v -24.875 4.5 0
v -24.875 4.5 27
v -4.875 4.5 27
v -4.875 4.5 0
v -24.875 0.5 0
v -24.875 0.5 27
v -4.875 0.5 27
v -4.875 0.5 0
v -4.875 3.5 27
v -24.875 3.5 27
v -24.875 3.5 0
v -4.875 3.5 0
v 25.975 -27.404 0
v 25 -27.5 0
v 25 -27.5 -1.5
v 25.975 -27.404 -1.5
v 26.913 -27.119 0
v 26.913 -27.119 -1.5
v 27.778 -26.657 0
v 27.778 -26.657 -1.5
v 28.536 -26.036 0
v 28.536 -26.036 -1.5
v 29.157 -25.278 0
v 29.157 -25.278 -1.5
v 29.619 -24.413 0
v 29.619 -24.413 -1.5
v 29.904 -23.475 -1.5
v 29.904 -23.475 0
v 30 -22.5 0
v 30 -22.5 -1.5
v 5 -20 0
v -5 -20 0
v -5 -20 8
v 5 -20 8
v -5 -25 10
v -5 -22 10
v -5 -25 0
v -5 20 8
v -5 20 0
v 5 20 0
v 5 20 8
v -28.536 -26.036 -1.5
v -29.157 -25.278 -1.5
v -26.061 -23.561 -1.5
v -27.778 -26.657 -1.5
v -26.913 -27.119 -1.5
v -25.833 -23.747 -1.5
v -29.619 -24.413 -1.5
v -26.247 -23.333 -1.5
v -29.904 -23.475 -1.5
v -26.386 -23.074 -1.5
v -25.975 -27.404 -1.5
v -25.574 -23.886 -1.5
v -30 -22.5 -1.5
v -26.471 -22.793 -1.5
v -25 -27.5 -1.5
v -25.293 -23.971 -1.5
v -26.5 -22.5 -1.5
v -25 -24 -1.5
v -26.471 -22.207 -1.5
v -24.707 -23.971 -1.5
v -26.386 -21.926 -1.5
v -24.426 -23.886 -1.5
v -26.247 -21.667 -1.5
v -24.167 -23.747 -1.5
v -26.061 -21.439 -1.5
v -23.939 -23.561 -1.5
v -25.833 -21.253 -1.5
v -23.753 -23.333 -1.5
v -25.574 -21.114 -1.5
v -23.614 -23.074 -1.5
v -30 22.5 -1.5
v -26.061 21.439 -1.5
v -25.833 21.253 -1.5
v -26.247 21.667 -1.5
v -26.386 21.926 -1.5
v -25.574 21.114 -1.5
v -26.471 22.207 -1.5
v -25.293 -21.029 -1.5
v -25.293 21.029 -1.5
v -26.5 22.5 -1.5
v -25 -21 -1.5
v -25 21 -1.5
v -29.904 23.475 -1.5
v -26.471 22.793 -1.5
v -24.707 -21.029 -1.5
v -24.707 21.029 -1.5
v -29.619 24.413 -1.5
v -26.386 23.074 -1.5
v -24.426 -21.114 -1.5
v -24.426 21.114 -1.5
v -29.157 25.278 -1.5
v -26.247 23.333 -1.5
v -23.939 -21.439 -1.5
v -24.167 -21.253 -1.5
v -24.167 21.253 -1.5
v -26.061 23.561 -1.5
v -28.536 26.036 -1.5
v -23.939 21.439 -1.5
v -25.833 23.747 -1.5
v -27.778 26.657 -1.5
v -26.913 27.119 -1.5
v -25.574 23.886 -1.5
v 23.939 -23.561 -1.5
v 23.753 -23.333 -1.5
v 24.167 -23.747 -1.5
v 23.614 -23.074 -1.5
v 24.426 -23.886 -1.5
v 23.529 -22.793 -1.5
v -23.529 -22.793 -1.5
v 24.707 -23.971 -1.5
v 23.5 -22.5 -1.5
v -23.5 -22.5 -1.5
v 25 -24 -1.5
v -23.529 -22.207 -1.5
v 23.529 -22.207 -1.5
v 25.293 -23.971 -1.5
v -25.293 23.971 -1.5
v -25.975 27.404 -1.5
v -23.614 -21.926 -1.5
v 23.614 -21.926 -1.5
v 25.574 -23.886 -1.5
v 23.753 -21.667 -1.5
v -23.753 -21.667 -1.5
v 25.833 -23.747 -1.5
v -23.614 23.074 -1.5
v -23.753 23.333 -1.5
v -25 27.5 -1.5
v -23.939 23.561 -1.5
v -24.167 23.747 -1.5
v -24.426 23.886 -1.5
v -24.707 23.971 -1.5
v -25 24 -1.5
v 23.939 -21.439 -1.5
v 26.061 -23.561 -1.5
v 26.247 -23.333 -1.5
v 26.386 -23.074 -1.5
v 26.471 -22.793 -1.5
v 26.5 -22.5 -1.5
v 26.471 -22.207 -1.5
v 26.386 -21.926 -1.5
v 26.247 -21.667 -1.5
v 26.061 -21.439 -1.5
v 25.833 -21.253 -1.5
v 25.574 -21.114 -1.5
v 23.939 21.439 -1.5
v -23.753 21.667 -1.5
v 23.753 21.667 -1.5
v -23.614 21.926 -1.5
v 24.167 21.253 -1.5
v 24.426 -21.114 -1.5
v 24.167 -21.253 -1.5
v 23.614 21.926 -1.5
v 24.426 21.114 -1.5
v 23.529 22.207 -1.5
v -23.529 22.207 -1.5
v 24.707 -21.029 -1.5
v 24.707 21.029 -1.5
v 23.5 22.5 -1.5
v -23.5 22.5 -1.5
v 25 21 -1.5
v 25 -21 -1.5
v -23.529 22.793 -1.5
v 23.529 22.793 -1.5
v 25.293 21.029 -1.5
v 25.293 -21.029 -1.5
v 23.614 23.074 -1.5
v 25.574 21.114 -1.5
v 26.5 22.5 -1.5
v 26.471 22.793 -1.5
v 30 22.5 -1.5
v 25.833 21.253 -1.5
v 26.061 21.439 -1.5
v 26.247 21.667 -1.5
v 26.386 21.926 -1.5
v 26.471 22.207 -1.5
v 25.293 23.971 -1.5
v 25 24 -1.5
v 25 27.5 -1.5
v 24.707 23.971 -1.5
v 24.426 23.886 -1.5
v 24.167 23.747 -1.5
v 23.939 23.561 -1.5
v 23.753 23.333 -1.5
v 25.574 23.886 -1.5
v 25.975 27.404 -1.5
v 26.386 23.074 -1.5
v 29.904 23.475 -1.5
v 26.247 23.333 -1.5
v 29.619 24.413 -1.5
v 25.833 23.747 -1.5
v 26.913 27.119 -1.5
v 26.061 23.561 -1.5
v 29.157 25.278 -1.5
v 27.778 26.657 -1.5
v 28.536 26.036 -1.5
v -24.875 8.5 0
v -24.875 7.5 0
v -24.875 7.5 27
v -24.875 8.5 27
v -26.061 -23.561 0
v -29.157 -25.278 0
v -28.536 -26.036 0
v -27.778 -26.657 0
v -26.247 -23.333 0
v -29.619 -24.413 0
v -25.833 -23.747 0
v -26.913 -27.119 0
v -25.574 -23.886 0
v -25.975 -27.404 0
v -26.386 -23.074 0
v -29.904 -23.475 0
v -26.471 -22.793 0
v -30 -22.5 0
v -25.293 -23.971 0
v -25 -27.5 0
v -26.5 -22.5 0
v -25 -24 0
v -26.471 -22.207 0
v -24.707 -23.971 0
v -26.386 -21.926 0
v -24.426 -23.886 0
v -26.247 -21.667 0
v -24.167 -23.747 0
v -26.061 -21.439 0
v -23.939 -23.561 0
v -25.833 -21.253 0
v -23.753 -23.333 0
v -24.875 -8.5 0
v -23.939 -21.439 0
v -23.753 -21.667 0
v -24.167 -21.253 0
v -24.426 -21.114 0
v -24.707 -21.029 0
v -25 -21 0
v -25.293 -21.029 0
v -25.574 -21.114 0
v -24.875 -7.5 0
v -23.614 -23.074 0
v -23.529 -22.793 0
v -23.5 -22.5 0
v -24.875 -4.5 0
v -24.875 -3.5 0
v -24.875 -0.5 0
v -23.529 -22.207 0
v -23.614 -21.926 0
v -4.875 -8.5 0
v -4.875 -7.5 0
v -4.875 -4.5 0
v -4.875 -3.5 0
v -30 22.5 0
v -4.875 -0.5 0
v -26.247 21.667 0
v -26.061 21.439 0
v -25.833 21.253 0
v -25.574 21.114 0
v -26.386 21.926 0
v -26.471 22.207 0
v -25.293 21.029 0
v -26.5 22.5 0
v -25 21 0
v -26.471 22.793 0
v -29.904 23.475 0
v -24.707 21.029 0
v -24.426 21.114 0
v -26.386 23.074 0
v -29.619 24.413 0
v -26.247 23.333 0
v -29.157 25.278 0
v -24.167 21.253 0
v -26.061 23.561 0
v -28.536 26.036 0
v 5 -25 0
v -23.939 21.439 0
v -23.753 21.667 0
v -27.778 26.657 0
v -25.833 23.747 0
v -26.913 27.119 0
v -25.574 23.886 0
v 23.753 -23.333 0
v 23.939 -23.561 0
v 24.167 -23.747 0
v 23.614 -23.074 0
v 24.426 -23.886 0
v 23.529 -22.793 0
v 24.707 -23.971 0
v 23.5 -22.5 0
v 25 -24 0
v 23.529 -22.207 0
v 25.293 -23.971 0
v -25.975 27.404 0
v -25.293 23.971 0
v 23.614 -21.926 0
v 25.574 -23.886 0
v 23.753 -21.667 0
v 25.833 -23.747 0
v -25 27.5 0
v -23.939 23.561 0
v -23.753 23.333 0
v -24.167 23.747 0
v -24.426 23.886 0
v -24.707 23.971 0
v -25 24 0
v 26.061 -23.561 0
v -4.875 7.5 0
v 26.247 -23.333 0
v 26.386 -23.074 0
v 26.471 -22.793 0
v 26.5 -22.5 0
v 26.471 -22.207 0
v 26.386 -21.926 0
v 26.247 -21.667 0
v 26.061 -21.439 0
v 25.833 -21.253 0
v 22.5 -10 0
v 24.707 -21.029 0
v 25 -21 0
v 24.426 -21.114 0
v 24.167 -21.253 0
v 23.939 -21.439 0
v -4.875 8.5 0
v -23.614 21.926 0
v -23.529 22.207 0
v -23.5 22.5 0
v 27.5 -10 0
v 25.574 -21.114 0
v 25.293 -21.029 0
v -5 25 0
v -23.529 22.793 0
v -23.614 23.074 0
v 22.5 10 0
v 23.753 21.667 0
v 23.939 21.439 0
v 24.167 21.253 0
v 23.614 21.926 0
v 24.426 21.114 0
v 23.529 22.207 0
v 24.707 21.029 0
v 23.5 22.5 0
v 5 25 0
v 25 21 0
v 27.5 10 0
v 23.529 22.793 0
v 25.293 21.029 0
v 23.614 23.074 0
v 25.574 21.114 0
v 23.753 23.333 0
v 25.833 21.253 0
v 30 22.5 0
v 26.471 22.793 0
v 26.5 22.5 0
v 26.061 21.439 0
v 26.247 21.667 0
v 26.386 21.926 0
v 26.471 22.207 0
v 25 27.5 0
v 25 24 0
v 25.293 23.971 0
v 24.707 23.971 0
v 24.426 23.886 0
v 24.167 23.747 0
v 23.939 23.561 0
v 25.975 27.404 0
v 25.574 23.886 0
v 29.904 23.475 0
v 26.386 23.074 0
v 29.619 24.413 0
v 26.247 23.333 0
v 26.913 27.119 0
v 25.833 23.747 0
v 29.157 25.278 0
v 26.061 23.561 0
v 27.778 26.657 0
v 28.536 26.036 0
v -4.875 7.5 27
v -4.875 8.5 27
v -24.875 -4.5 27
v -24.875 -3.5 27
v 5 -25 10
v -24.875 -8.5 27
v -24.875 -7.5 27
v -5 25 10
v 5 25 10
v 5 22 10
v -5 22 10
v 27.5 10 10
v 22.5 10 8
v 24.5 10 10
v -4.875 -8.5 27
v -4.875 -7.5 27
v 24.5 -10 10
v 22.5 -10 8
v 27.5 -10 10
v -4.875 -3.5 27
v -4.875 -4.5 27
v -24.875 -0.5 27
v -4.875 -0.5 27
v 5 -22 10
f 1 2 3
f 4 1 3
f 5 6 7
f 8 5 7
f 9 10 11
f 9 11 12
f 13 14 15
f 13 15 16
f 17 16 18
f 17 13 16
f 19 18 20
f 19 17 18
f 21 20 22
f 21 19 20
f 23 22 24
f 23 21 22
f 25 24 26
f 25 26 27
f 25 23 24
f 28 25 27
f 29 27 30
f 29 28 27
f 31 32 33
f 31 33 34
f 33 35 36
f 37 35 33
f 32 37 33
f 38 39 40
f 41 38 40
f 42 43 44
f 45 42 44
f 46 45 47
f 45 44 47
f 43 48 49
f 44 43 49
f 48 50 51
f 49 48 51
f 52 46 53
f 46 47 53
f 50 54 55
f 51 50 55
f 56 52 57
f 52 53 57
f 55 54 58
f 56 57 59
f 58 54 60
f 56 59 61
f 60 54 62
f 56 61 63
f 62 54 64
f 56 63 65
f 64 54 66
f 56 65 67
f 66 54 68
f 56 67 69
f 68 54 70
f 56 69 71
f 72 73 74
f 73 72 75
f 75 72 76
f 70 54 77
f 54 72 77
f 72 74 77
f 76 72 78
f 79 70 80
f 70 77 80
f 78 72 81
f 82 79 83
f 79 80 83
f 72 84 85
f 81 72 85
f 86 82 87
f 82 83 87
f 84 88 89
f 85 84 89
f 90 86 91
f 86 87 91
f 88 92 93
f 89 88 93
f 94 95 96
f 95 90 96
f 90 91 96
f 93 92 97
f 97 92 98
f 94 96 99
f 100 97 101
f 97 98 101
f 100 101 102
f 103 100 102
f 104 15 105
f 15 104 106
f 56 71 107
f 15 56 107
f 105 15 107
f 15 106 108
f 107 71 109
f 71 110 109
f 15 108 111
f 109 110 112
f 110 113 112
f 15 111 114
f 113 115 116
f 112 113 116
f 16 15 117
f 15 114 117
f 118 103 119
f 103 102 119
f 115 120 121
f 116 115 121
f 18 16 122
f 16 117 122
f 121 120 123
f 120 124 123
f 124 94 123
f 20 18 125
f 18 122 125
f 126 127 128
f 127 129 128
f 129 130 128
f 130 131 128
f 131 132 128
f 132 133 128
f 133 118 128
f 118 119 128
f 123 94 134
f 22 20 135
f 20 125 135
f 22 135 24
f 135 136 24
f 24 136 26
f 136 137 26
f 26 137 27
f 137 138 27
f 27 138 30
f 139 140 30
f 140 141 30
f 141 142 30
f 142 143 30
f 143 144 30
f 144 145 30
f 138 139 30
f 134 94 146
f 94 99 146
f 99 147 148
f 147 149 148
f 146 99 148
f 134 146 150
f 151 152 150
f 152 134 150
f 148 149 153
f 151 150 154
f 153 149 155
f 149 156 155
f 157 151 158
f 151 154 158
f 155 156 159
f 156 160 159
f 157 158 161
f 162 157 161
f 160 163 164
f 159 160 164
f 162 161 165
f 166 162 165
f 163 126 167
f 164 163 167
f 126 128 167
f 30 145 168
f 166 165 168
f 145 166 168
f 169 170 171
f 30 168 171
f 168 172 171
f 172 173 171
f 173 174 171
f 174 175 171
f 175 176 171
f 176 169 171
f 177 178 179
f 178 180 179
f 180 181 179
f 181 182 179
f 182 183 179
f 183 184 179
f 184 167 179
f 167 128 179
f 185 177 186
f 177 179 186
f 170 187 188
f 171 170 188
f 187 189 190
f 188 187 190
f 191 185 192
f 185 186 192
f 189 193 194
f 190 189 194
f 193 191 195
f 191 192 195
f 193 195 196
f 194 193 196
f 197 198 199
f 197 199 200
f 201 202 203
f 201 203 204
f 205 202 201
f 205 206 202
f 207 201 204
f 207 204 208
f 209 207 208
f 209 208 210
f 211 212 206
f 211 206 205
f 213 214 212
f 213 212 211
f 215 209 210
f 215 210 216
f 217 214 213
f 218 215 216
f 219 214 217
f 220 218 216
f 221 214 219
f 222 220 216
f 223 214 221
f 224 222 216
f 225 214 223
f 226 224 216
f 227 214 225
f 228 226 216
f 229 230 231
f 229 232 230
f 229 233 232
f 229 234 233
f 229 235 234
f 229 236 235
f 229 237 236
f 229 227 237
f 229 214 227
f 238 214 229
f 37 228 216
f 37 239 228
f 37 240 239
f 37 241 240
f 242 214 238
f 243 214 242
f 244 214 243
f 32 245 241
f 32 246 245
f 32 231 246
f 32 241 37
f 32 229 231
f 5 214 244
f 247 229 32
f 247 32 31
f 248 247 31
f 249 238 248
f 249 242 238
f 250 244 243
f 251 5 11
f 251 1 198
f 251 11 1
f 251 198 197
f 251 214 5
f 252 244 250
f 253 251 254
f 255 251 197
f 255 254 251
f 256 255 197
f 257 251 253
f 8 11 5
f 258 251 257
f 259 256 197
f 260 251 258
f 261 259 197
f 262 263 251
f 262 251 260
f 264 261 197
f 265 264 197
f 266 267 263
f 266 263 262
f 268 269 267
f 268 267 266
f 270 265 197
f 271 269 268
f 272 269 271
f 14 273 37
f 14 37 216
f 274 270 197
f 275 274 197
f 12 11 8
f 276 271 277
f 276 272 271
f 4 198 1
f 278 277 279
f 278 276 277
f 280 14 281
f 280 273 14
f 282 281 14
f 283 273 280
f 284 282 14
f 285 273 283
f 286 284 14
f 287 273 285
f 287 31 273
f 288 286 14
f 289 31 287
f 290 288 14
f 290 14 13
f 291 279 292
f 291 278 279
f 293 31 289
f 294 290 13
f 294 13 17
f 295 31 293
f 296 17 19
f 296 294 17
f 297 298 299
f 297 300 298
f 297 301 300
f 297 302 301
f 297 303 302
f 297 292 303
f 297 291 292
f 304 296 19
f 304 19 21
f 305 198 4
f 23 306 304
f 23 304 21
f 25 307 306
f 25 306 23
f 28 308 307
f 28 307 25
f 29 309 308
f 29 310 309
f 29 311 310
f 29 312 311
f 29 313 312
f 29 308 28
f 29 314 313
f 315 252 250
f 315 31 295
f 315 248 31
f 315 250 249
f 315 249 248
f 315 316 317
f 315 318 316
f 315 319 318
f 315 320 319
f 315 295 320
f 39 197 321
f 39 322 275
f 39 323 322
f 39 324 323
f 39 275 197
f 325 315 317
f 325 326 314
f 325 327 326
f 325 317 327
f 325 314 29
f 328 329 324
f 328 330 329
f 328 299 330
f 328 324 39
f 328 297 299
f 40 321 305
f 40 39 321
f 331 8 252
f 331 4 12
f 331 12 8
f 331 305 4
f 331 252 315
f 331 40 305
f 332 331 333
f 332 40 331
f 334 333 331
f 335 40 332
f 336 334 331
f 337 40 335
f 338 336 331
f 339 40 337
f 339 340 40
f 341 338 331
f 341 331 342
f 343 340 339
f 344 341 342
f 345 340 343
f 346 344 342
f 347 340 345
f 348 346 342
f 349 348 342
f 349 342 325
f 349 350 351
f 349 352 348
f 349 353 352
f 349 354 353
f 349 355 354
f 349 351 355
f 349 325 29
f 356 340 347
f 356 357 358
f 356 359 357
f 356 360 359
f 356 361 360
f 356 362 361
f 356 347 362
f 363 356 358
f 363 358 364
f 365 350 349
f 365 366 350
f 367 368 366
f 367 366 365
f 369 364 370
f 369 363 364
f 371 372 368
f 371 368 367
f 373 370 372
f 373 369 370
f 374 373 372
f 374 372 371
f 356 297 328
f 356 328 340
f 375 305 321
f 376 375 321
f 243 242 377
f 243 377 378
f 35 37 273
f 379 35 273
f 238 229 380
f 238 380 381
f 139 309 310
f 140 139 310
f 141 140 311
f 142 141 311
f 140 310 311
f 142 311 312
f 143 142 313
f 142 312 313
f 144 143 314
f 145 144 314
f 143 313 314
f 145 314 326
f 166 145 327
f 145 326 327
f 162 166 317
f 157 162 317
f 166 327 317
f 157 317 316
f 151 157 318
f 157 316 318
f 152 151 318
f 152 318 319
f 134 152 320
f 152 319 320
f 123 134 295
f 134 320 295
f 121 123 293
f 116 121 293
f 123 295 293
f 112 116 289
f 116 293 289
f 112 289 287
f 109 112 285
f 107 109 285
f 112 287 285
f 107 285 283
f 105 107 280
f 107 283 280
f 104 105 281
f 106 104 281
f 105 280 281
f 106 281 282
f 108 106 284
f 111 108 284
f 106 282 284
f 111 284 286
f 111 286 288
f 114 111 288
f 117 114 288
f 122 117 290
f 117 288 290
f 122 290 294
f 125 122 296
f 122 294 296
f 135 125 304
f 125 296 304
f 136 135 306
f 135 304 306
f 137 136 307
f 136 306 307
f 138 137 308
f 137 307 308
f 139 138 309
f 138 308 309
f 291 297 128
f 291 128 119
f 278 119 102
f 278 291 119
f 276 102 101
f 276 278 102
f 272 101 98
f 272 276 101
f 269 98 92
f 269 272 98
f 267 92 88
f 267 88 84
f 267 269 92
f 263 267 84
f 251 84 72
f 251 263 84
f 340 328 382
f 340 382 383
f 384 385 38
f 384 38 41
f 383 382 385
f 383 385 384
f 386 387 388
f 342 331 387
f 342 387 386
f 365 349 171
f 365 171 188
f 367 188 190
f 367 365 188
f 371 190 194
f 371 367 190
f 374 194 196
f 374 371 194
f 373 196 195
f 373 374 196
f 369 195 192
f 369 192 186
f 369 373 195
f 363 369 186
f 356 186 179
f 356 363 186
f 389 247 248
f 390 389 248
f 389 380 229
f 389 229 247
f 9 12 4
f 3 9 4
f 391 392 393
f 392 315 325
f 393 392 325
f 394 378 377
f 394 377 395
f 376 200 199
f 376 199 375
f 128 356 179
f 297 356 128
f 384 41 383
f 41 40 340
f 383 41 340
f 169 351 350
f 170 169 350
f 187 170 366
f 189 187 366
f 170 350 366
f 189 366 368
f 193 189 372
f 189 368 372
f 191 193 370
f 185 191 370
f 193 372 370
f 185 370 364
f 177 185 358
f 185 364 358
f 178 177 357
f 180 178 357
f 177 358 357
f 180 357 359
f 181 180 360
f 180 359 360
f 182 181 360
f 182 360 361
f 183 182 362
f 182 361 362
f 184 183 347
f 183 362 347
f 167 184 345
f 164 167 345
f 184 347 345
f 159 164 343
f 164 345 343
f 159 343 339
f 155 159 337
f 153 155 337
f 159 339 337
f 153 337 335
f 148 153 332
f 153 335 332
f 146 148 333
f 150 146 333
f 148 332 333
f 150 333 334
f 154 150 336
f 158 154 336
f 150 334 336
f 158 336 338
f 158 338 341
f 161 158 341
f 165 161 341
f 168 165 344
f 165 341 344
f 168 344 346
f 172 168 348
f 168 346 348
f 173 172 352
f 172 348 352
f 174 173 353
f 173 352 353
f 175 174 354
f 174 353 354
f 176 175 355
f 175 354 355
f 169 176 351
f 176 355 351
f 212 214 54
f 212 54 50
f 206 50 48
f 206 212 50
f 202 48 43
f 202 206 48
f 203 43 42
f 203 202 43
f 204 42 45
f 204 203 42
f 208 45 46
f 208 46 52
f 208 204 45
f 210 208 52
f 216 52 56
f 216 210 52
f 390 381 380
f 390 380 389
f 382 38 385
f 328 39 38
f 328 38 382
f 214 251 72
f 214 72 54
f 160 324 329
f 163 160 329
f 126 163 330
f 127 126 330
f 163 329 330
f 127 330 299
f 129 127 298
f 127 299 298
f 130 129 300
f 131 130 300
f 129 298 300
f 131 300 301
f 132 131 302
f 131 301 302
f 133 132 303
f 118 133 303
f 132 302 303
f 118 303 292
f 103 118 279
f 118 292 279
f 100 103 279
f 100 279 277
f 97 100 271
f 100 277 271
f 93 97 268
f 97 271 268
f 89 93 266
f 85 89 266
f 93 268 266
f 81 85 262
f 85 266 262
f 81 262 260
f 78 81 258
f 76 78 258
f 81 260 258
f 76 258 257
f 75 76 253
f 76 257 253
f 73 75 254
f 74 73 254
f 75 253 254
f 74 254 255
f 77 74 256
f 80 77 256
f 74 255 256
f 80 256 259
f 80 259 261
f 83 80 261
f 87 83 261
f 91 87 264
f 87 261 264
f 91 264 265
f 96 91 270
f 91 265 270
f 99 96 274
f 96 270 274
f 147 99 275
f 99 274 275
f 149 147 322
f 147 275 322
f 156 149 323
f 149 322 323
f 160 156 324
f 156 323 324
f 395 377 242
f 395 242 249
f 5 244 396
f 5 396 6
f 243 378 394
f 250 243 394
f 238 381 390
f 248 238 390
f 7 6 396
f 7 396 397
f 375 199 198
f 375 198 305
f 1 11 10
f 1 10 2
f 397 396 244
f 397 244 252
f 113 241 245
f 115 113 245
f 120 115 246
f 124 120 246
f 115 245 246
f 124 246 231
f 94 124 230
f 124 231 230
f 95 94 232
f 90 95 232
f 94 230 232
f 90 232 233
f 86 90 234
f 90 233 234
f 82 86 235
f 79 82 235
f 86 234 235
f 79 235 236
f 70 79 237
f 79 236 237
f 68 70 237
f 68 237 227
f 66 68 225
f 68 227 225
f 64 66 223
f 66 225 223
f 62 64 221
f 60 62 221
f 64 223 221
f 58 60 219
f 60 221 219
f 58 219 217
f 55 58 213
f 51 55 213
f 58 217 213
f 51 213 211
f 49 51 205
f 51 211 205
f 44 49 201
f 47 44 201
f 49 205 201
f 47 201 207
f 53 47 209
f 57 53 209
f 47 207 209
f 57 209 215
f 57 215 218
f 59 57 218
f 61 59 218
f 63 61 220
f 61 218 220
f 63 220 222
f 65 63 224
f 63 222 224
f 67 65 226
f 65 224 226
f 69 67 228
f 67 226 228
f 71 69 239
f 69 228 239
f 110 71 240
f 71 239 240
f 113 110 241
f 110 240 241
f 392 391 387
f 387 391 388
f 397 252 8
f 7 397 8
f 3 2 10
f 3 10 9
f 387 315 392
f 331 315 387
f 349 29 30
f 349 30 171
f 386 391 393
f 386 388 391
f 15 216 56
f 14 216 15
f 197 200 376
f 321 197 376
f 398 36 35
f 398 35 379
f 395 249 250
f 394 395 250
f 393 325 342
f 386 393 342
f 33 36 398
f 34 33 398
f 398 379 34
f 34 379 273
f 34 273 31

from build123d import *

# Parameters (mm, degrees)
F0_R     = 1.5
F1_DEPTH = 1.5
F2_W     = 20
F2_H     = 1
F3_DEPTH = 27
F4_W     = 10
F4_H     = 5
F4_W_2   = 5
F4_H_2   = 20
F5_DEPTH = 10
F6_SIZE  = 2


with BuildPart() as f1:
    # F0 (on Top) → F1 (new body)
    with BuildSketch(Plane.XY):
        with BuildLine():
            ThreePointArc((30, 22.5), (28.535534, 26.035534), (25, 27.5))
            Line((25, 27.5), (-25, 27.5))
            ThreePointArc((-25, 27.5), (-28.535534, 26.035534), (-30, 22.5))
            Line((-30, 22.5), (-30, -22.5))
            ThreePointArc((-30, -22.5), (-28.535534, -26.035534), (-25, -27.5))
            Line((-25, -27.5), (25, -27.5))
            ThreePointArc((25, -27.5), (28.535534, -26.035534), (30, -22.5))
            Line((30, -22.5), (30, 22.5))
        make_face()
        with Locations((-25, -22.5)):
            Circle(F0_R, mode=Mode.SUBTRACT)
        with Locations((25, -22.5)):
            Circle(F0_R, mode=Mode.SUBTRACT)
        with Locations((-25, 22.5)):
            Circle(F0_R, mode=Mode.SUBTRACT)
        with Locations((25, 22.5)):
            Circle(F0_R, mode=Mode.SUBTRACT)
    extrude(amount=-F1_DEPTH)

    # F2 (on face) → F3 (join)
    with BuildSketch(Plane.XY):
        with Locations((-14.875233, 0)):
            Rectangle(F2_W, F2_H)
        with Locations((-14.875233, 4)):
            Rectangle(F2_W, F2_H)
        with Locations((-14.875233, 8)):
            Rectangle(F2_W, F2_H)
        with Locations((-14.875233, -4)):
            Rectangle(F2_W, F2_H)
        with Locations((-14.875233, -8)):
            Rectangle(F2_W, F2_H)
    extrude(amount=F3_DEPTH)

    # F4 (on face) → F5 (join)
    with BuildSketch(Plane.XY):
        with Locations((0, 22.5)):
            Rectangle(F4_W, F4_H)
        with Locations((0, -22.5)):
            Rectangle(F4_W, F4_H)
        with Locations((25, 0)):
            Rectangle(F4_W_2, F4_H_2)
    extrude(amount=F5_DEPTH)

    # F6
    f6_edges = [f1.edges().sort_by_distance(p)[0] for p in [
        (0, 20, 10),
        (22.5, 0, 10),
        (0, -20, 10),
    ]]
    chamfer(f6_edges, length=F6_SIZE)


solid = f1.part
